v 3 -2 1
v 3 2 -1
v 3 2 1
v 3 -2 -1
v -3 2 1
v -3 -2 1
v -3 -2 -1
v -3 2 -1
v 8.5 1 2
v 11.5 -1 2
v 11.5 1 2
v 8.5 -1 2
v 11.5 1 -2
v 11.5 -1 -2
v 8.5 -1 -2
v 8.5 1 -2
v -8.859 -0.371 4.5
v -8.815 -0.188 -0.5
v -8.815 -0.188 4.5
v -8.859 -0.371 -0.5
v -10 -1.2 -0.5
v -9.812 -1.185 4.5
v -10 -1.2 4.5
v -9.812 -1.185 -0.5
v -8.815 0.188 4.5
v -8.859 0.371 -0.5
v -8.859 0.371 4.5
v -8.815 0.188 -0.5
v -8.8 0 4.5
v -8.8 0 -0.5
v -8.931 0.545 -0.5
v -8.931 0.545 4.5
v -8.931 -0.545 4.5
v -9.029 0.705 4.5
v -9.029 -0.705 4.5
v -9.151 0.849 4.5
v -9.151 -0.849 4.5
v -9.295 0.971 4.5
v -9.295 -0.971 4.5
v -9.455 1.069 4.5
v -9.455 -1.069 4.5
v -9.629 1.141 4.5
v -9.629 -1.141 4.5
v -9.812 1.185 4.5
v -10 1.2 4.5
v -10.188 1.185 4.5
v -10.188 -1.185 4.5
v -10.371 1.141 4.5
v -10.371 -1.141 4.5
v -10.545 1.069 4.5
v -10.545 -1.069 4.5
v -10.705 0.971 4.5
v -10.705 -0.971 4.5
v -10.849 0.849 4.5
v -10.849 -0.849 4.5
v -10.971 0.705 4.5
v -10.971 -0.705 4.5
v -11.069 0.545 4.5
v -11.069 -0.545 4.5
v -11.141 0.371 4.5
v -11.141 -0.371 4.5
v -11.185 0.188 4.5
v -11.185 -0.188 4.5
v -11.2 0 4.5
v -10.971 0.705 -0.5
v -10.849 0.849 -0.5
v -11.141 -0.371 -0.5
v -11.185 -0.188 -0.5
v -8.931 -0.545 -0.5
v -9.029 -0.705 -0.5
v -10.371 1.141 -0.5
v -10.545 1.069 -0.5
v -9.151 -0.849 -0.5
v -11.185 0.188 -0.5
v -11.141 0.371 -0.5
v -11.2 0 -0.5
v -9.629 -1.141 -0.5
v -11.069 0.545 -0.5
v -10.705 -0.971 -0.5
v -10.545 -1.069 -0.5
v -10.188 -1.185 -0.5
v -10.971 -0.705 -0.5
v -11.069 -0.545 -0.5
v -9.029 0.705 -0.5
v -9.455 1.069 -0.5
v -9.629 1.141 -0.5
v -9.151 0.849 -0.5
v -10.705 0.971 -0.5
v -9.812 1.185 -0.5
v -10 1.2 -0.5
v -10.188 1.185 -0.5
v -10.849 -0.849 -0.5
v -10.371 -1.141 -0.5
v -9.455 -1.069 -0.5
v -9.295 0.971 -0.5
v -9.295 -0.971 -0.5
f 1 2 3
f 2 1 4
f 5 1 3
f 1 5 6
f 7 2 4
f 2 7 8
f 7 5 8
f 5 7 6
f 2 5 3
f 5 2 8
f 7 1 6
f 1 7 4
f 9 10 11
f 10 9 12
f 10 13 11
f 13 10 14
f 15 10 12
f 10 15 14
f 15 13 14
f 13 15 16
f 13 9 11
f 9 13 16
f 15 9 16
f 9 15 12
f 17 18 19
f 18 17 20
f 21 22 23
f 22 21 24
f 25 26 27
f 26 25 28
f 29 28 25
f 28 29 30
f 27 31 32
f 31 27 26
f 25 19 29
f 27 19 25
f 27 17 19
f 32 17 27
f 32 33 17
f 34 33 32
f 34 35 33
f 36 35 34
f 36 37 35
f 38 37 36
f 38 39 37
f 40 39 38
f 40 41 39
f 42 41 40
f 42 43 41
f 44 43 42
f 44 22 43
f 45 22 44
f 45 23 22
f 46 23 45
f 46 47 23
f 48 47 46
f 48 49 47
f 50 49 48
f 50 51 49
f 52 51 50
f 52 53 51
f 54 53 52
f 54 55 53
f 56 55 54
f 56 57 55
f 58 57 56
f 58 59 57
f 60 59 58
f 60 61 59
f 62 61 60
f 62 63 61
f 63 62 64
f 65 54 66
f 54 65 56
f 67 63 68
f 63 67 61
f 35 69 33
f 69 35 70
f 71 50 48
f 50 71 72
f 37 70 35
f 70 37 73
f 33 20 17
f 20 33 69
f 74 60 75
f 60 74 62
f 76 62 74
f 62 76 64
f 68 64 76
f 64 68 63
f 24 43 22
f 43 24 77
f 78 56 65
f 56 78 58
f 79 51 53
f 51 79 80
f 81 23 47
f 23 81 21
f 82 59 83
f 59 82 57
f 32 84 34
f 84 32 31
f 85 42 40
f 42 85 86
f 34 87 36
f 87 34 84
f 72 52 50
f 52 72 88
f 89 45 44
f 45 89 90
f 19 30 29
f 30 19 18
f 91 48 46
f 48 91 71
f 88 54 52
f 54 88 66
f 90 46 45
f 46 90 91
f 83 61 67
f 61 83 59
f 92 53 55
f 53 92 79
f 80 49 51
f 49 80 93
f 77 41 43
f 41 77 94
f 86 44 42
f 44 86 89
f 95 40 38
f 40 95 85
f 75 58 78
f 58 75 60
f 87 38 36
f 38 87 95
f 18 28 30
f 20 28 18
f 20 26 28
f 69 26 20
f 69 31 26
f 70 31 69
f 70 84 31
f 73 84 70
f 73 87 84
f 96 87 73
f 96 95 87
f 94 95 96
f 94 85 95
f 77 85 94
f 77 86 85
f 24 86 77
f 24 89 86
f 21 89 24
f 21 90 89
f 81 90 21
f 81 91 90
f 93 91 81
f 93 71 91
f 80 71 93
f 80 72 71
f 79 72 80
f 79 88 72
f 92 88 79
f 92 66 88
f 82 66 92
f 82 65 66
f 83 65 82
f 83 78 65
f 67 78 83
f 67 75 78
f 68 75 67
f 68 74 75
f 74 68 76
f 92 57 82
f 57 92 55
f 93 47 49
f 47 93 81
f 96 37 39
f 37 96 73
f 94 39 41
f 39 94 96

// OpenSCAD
union() {
    resize([6, 4, 2])
        cube([2, 2, 2], center = true);

    translate([10, 0, 0])
        mirror([1, 0, 0])
            cube([3, 2, 4], center = true);

    multmatrix([
        [1, 0, 0, -10],
        [0, 1, 0, 0],
        [0, 0, 1, 2],
        [0, 0, 0, 1]
    ])
        cylinder(h = 5, r = 1.2, center = true, $fn = 40);
}
